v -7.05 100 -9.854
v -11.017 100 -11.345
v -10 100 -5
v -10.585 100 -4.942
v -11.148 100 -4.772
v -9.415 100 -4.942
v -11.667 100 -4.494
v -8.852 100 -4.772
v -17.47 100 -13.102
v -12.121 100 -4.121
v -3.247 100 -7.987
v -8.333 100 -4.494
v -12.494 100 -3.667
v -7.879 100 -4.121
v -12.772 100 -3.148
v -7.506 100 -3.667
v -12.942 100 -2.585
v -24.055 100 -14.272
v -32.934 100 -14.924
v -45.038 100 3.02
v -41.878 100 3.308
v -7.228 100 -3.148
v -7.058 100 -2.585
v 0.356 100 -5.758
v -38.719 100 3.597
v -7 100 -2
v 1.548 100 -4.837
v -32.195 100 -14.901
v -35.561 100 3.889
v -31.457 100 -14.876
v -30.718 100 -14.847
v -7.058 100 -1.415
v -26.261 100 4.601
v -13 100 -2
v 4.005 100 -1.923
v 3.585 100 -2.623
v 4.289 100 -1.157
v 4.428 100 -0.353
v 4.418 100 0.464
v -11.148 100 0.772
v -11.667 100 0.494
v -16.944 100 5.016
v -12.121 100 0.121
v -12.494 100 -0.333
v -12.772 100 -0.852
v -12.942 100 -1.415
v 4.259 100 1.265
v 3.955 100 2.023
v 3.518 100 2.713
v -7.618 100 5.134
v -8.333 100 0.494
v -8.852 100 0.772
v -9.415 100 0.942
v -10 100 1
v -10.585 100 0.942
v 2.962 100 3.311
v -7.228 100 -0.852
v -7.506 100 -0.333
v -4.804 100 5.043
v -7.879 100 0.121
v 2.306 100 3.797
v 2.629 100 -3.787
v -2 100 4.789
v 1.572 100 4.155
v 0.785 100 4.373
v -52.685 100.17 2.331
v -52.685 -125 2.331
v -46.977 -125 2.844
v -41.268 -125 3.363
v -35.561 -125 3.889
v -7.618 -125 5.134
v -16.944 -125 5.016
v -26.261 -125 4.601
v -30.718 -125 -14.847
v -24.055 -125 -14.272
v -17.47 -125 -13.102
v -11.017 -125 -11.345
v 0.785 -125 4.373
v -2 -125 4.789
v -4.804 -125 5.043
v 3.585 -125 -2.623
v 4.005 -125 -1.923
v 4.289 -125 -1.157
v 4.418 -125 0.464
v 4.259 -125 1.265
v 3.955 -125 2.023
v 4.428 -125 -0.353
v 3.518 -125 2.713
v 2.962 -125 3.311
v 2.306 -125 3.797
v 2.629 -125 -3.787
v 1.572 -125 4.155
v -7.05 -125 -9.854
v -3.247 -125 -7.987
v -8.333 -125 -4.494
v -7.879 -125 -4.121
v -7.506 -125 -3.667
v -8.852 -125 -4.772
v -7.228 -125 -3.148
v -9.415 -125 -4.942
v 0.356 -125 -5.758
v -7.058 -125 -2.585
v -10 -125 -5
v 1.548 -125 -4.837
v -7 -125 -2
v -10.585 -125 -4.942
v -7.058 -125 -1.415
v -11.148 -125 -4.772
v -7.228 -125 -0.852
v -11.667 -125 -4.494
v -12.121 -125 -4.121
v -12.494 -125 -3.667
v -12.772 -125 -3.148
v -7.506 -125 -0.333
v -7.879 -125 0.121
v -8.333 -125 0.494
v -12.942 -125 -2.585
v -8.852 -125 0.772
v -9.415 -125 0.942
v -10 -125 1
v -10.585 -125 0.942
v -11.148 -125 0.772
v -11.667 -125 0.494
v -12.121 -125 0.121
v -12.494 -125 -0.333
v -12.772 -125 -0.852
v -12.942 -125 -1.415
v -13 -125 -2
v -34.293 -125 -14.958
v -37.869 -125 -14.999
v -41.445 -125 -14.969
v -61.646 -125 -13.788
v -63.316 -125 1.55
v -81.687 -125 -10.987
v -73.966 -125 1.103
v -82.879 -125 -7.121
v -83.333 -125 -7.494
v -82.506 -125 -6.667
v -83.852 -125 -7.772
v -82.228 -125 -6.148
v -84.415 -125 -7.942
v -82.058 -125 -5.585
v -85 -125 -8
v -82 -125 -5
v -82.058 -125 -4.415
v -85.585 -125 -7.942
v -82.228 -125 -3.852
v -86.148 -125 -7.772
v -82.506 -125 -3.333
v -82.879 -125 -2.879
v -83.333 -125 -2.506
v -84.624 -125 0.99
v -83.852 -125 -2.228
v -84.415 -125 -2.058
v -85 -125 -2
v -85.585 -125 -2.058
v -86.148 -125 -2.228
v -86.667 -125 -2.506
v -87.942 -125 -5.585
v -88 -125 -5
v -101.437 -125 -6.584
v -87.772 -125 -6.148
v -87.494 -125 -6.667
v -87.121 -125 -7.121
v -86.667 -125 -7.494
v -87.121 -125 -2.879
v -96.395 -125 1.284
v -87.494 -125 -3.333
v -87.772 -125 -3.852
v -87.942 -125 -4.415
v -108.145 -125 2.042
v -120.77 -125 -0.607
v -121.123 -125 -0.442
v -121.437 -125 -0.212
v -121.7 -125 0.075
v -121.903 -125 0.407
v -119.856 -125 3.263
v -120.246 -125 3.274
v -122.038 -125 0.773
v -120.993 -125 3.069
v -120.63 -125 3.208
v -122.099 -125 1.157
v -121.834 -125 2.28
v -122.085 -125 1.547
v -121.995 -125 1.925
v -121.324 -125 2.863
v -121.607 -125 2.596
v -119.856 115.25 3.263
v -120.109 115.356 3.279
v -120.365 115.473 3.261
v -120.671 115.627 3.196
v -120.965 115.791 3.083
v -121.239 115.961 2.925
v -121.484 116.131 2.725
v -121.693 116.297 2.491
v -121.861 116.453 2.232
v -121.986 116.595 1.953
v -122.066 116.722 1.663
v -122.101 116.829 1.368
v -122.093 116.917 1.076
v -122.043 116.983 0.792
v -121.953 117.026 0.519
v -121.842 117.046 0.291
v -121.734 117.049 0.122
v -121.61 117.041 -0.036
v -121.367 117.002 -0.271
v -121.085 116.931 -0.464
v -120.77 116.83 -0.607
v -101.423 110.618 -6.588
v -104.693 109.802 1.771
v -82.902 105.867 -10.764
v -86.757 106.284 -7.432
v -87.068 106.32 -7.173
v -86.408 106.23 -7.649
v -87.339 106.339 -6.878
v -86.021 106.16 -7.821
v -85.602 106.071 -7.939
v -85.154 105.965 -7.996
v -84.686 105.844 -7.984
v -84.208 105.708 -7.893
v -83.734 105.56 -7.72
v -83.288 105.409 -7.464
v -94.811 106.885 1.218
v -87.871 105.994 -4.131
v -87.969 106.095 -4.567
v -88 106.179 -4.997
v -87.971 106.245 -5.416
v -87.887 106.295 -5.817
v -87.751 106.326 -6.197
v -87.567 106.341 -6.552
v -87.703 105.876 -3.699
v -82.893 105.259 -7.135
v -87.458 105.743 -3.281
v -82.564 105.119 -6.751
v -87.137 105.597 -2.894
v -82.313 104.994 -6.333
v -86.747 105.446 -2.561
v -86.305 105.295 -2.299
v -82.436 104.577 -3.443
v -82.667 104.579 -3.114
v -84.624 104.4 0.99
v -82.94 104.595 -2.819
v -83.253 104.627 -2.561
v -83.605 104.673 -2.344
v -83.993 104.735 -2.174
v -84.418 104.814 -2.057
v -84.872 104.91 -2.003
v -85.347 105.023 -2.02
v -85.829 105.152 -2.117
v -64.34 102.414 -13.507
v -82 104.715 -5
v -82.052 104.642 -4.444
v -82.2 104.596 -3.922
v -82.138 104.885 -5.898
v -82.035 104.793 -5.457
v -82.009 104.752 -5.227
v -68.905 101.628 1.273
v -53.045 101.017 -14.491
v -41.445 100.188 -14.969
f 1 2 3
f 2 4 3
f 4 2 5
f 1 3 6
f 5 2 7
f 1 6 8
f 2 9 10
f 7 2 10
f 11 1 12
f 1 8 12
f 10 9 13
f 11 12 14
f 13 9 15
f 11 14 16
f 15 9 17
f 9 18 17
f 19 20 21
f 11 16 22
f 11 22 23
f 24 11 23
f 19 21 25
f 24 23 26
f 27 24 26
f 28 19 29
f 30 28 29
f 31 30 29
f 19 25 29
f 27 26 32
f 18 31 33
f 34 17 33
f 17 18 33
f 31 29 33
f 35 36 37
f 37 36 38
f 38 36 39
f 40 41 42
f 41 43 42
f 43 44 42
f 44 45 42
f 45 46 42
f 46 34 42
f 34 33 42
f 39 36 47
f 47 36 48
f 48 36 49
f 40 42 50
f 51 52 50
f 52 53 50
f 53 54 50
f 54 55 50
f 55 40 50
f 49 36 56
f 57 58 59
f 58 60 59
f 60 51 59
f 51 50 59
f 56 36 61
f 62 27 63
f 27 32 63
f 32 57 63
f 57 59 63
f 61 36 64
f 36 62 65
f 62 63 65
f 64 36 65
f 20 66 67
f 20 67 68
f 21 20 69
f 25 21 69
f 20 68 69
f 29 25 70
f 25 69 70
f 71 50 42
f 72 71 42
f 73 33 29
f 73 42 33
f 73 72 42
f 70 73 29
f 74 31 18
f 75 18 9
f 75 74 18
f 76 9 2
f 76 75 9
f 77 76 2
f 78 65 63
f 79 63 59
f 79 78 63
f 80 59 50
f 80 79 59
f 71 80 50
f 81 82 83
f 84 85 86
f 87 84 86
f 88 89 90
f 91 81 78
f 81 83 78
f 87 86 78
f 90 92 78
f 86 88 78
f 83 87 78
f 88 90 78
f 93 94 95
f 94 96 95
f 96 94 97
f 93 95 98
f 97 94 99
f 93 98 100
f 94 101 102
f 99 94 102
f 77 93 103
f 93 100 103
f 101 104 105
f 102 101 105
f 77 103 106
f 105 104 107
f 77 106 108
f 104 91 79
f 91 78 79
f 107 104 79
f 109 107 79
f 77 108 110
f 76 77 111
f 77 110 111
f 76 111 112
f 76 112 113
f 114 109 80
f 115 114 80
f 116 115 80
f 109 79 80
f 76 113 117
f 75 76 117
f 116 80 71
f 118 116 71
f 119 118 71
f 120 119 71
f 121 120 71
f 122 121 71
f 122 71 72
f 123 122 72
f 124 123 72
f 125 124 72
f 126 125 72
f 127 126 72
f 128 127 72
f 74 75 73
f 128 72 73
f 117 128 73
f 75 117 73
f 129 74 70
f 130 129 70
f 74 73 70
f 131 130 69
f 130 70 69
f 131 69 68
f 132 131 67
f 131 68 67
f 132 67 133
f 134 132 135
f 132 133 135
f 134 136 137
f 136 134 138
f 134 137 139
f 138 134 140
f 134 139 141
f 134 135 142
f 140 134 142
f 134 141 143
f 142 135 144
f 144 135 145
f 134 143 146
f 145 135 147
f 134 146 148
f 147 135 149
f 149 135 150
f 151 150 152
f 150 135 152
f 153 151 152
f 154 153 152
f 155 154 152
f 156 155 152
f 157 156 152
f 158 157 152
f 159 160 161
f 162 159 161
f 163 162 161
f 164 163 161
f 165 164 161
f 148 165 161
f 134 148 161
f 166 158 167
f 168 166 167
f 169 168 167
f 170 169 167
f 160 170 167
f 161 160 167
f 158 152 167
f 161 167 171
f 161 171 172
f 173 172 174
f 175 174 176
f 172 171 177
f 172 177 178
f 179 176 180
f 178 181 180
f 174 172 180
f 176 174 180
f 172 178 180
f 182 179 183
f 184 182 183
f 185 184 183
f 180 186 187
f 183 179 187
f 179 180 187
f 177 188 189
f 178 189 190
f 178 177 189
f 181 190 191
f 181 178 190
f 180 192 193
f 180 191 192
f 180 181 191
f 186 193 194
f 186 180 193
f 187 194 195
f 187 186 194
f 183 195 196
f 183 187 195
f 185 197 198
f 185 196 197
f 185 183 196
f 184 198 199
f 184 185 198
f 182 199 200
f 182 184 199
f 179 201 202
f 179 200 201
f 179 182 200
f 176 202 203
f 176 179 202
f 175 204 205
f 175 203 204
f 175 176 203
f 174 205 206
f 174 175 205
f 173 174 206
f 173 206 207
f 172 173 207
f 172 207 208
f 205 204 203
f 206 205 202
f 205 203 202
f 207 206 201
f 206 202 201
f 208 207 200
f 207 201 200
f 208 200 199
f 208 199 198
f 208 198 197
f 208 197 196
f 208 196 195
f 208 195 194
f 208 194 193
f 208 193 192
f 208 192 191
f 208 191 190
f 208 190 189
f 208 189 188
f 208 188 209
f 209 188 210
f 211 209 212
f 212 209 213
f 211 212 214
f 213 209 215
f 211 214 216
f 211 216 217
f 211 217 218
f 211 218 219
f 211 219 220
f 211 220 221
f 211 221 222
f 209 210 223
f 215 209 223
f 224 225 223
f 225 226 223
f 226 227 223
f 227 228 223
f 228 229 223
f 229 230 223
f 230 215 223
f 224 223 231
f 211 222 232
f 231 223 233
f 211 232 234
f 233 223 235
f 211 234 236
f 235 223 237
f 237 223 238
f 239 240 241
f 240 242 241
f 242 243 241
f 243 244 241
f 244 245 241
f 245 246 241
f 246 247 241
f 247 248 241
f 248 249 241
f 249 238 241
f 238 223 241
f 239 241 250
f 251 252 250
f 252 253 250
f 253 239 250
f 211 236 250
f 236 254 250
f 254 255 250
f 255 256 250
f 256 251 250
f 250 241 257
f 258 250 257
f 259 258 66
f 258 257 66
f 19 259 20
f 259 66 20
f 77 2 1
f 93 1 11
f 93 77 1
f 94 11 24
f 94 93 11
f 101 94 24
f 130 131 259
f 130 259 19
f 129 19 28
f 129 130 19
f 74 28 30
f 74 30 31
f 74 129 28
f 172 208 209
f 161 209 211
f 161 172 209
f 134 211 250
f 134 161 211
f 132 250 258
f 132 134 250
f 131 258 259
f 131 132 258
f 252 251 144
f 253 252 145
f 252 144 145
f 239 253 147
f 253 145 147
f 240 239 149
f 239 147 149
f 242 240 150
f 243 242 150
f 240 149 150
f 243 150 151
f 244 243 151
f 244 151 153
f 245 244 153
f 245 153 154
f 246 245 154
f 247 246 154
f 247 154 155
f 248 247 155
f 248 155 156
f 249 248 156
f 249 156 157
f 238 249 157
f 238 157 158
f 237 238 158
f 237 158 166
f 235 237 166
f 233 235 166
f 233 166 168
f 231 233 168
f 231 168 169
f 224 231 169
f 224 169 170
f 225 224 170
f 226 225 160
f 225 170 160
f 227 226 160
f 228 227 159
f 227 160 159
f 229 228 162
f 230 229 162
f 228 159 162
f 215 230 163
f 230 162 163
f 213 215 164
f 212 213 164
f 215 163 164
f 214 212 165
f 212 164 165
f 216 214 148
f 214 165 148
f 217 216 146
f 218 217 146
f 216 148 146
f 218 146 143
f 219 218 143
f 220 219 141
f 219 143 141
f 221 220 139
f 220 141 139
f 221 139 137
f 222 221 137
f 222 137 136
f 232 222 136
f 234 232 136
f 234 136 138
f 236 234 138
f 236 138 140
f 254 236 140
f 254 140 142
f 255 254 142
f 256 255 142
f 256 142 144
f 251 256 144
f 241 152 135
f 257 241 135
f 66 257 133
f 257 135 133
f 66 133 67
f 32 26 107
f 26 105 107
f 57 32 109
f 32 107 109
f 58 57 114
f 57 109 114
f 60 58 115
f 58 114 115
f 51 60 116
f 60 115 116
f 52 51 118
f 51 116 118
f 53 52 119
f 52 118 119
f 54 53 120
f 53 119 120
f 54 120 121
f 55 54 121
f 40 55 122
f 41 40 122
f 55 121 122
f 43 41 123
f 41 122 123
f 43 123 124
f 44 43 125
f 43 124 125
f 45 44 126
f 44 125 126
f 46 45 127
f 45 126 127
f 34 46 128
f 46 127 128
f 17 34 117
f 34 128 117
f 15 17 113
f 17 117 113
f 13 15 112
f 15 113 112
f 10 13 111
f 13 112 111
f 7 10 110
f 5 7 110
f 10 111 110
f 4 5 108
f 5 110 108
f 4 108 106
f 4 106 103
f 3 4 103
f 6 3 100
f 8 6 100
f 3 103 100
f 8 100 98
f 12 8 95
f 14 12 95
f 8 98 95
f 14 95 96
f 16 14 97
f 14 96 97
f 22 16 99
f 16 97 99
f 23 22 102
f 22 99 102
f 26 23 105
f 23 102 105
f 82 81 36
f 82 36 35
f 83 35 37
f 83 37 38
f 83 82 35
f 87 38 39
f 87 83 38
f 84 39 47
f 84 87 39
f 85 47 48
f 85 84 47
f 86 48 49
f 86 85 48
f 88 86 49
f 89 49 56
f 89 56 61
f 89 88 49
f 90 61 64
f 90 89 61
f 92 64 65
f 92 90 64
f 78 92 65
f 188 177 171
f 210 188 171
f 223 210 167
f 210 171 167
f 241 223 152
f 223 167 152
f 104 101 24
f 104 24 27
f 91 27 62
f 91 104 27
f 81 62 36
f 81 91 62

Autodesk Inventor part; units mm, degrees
ref_plane "YZ Plane" through (0, 0, 0) normal (1, 0, 0) x (0, 1, 0)
ref_plane "XZ Plane" through (0, 0, 0) normal (0, 1, 0) x (-1, 0, 0)
sketch "スケッチ1" plane through (0, 0, 0) normal (0, 1, 0) x (-1, 0, 0)
  arc A0 (41.4452, -14.9694) -> (120.7701, -0.6068) centre (36.8758, 236.5065) ccw projected
  arc A1 (30.7183, -14.8468) -> (41.4452, -14.9694) centre (38.1525, 166.2425) ccw projected
  arc A2 (11.0166, -11.3447) -> (30.7183, -14.8468) centre (33.77, 59.49) ccw projected
  arc A3 (-0.3565, -5.7585) -> (11.0166, -11.3447) centre (24.3575, 30.1875) ccw projected
  arc A4 (-3.5852, -2.6234) -> (-0.3565, -5.7585) centre (7.25, 5.305) ccw projected
  arc A5 (-0.7848, 4.3726) -> (-3.5852, -2.6234) centre (0, 0) ccw projected
  arc A6 (7.6183, 5.1344) -> (-0.7848, 4.3726) centre (7.775, -43.32) ccw projected
  arc A7 (35.5607, 3.8888) -> (7.6183, 5.1344) centre (8.565, -287.665) ccw projected
  arc A8 (35.5607, 3.8888) -> (52.6853, 2.3311) centre (526.9475, 5310.875) ccw projected
  arc A9 (52.6853, 2.3311) -> (84.6244, 0.9905) centre (82.86, 340.0849) ccw projected
  arc A10 (84.6244, 0.9905) -> (119.8564, 3.2634) centre (83.0725, 299.245) ccw projected
  arc A11 (120.7701, -0.6068) -> (119.8564, 3.2634) centre (120.103, 1.2786) ccw projected
  point P0 (0, 0)
extrude "押し出し1" add sketch "スケッチ1" along normal mid plane 250
sketch "スケッチ2" plane through (0, -125, 0) normal (0, -1, 0) x (1, 0, 0)
  circle A0 centre (-85, -5) radius 3 projected
  circle A1 centre (-10, -2) radius 3 projected
  point P0 (0, 0)
extrude "押し出し2" cut sketch "スケッチ2" against normal up to next
ref_plane "作業平面2" through (-121.2214, 0, 2.9367) normal (-0.5592, 0, 0.829) x (0, -1, 0)
ref_plane "作業平面1" through (-146.4564, 100, -7.5667) normal (-0.5592, 0, 0.829) x (0.829, 0, 0.5592)
sketch "スケッチ3" plane through (-121.2214, 0, 2.9367) normal (-0.5592, 0, 0.829) x (0, -1, 0)
  arc A0 (-135, -26.7942) -> (-100, 63.2058) centre (-233.2143, 63.2058) ccw projected
  line L0 (-100, 63.2058) -> (-100, 73.2058) projected
  line L1 (-100, 473.2058) -> (-100, 73.2058) projected
  line L2 (-135, -26.7942) -> (-135, 113.2058)
  line L3 (-135, 113.2058) -> (-100, 113.2058)
  point P0 (0, 98.855)
  dimension "d6" = 140
extrude "押し出し3" cut sketch "スケッチ3" against normal through all
properties part number "subflap_top"
